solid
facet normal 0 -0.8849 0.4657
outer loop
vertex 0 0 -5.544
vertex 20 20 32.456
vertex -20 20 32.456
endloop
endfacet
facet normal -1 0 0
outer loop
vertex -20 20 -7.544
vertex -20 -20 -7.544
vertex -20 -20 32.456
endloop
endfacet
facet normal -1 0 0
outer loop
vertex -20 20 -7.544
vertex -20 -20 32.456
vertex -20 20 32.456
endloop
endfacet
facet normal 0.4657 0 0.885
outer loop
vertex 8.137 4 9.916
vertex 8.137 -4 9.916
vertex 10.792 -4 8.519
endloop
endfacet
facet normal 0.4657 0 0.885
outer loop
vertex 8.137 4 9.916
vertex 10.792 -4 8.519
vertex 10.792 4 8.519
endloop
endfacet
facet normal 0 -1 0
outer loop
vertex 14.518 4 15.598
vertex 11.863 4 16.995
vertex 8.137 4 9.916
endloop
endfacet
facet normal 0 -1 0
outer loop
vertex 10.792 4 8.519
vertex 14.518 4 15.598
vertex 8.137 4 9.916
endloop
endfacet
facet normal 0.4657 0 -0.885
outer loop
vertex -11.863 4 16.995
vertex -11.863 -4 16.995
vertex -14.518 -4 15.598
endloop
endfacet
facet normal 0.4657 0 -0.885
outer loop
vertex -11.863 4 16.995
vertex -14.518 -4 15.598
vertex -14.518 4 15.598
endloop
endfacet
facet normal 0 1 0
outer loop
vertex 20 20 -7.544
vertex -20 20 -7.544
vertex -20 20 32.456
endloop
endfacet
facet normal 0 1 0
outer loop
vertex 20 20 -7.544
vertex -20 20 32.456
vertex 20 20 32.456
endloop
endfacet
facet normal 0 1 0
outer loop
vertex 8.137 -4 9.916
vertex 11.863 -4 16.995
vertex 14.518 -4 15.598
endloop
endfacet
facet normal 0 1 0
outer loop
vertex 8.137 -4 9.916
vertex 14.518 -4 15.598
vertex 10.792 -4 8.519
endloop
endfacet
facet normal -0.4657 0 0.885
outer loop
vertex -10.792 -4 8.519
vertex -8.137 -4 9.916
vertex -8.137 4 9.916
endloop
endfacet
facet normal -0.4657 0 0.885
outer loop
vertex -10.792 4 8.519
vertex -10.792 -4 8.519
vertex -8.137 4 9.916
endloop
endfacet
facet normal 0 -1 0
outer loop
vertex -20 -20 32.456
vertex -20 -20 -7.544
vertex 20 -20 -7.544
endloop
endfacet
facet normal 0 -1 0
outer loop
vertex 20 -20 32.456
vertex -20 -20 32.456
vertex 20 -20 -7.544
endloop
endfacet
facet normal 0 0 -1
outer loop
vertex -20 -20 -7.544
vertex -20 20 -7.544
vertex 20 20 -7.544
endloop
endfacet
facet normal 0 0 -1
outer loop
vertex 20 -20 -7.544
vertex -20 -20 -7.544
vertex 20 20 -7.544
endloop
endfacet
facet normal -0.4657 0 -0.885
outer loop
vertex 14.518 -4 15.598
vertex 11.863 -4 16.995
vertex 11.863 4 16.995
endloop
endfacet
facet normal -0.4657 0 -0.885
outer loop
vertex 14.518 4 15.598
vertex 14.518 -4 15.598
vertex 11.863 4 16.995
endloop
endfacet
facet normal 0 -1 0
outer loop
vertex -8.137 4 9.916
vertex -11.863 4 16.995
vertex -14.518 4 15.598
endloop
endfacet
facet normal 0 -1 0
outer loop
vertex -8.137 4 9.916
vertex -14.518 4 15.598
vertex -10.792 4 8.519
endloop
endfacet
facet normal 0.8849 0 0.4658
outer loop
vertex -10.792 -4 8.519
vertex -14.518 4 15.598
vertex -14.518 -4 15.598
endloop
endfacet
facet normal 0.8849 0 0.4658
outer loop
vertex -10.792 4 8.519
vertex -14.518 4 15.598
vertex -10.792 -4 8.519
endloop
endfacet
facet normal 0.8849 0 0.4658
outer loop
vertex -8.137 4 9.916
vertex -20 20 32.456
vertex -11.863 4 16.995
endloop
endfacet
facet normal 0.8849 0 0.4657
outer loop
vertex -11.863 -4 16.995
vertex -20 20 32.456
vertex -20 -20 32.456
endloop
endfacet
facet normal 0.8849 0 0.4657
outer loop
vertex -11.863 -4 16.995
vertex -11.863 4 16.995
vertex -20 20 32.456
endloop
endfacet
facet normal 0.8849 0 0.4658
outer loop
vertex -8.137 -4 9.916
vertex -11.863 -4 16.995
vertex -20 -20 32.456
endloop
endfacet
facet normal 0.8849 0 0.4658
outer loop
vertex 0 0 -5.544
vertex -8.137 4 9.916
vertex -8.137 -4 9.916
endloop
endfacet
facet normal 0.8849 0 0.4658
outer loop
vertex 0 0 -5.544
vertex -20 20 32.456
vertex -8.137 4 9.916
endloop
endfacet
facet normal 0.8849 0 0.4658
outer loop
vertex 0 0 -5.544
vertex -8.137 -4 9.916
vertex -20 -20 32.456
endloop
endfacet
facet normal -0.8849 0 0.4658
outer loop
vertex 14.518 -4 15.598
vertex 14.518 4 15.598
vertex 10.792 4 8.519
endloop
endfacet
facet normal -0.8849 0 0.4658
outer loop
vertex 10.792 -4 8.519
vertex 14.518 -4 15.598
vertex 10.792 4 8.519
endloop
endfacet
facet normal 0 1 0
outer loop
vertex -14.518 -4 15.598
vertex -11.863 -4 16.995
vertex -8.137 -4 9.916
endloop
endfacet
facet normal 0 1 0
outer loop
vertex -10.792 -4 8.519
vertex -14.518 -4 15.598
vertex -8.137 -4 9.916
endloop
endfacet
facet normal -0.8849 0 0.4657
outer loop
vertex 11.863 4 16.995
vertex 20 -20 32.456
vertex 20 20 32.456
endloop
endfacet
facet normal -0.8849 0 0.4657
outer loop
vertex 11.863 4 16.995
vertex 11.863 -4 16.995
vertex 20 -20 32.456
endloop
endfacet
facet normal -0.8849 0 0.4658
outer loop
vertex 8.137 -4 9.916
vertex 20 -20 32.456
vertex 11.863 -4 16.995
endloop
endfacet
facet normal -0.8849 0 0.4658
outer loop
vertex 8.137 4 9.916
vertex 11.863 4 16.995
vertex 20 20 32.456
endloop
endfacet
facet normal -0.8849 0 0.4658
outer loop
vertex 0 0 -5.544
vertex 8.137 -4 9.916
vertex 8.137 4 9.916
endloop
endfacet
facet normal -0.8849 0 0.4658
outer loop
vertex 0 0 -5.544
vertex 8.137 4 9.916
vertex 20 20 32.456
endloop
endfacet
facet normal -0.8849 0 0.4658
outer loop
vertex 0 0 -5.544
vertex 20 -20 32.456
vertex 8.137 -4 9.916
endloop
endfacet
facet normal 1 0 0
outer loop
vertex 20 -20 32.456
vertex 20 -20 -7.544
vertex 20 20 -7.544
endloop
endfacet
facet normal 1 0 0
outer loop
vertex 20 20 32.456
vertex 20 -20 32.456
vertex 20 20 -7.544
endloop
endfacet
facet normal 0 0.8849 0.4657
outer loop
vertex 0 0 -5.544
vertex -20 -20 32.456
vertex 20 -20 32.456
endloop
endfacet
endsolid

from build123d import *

# Parameters (mm, degrees)
SKETCH1_W           = 20
SKETCH1_H           = 20
BOSS_EXTRUDE1_DEPTH = 20
SKETCH7_W           = 4
SKETCH7_H           = 4
CUT_EXTRUDE2_DEPTH  = 1.5
SCALE1_SCALE        = 2


with BuildPart() as part:
    # Sketch1 → Boss-Extrude1 (new body)
    with BuildSketch(Plane.XY):
        Rectangle(SKETCH1_W, SKETCH1_H)
    extrude(amount=BOSS_EXTRUDE1_DEPTH)

    # Sketch6 → entrada furo section 0
    with BuildSketch(Plane.XY.offset(20), mode=Mode.PRIVATE) as entrada_furo_s0:
        with BuildLine():
            Line((-10, 10), (-10, -10))
            Line((-10, -10), (10, -10))
            Line((10, -10), (10, 10))
            Line((10, 10), (-10, 10))
        make_face()
    loft([entrada_furo_s0.sketch, Vertex(0, 0, 1)], mode=Mode.SUBTRACT)

    # Sketch7 → Cut-Extrude2 (cut)
    with BuildSketch(Plane(origin=(0.412147505, 0, 0.21691974), x_dir=(0.46574643283262235, 0, -0.8849182223819824), z_dir=(0.8849182223819824, 0, 0.46574643283262235))):
        with Locations((-11.620373499, 0)):
            Rectangle(SKETCH7_W, SKETCH7_H)
    cut_extrude2 = extrude(amount=-CUT_EXTRUDE2_DEPTH, mode=Mode.SUBTRACT)

    # Mirror1: Cut-Extrude2 across plane
    add(cut_extrude2.mirror(Plane(origin=(0, 0, 0), x_dir=(0, 0, 1), z_dir=(1, 0, 0))), mode=Mode.SUBTRACT)


with BuildPart() as part_1:
    # Scale1: scaled about (0, 0, 7.5441868)
    add(part.part.scale(SCALE1_SCALE).moved(Location((0, 0, -7.5441868))))


solid = part_1.part
